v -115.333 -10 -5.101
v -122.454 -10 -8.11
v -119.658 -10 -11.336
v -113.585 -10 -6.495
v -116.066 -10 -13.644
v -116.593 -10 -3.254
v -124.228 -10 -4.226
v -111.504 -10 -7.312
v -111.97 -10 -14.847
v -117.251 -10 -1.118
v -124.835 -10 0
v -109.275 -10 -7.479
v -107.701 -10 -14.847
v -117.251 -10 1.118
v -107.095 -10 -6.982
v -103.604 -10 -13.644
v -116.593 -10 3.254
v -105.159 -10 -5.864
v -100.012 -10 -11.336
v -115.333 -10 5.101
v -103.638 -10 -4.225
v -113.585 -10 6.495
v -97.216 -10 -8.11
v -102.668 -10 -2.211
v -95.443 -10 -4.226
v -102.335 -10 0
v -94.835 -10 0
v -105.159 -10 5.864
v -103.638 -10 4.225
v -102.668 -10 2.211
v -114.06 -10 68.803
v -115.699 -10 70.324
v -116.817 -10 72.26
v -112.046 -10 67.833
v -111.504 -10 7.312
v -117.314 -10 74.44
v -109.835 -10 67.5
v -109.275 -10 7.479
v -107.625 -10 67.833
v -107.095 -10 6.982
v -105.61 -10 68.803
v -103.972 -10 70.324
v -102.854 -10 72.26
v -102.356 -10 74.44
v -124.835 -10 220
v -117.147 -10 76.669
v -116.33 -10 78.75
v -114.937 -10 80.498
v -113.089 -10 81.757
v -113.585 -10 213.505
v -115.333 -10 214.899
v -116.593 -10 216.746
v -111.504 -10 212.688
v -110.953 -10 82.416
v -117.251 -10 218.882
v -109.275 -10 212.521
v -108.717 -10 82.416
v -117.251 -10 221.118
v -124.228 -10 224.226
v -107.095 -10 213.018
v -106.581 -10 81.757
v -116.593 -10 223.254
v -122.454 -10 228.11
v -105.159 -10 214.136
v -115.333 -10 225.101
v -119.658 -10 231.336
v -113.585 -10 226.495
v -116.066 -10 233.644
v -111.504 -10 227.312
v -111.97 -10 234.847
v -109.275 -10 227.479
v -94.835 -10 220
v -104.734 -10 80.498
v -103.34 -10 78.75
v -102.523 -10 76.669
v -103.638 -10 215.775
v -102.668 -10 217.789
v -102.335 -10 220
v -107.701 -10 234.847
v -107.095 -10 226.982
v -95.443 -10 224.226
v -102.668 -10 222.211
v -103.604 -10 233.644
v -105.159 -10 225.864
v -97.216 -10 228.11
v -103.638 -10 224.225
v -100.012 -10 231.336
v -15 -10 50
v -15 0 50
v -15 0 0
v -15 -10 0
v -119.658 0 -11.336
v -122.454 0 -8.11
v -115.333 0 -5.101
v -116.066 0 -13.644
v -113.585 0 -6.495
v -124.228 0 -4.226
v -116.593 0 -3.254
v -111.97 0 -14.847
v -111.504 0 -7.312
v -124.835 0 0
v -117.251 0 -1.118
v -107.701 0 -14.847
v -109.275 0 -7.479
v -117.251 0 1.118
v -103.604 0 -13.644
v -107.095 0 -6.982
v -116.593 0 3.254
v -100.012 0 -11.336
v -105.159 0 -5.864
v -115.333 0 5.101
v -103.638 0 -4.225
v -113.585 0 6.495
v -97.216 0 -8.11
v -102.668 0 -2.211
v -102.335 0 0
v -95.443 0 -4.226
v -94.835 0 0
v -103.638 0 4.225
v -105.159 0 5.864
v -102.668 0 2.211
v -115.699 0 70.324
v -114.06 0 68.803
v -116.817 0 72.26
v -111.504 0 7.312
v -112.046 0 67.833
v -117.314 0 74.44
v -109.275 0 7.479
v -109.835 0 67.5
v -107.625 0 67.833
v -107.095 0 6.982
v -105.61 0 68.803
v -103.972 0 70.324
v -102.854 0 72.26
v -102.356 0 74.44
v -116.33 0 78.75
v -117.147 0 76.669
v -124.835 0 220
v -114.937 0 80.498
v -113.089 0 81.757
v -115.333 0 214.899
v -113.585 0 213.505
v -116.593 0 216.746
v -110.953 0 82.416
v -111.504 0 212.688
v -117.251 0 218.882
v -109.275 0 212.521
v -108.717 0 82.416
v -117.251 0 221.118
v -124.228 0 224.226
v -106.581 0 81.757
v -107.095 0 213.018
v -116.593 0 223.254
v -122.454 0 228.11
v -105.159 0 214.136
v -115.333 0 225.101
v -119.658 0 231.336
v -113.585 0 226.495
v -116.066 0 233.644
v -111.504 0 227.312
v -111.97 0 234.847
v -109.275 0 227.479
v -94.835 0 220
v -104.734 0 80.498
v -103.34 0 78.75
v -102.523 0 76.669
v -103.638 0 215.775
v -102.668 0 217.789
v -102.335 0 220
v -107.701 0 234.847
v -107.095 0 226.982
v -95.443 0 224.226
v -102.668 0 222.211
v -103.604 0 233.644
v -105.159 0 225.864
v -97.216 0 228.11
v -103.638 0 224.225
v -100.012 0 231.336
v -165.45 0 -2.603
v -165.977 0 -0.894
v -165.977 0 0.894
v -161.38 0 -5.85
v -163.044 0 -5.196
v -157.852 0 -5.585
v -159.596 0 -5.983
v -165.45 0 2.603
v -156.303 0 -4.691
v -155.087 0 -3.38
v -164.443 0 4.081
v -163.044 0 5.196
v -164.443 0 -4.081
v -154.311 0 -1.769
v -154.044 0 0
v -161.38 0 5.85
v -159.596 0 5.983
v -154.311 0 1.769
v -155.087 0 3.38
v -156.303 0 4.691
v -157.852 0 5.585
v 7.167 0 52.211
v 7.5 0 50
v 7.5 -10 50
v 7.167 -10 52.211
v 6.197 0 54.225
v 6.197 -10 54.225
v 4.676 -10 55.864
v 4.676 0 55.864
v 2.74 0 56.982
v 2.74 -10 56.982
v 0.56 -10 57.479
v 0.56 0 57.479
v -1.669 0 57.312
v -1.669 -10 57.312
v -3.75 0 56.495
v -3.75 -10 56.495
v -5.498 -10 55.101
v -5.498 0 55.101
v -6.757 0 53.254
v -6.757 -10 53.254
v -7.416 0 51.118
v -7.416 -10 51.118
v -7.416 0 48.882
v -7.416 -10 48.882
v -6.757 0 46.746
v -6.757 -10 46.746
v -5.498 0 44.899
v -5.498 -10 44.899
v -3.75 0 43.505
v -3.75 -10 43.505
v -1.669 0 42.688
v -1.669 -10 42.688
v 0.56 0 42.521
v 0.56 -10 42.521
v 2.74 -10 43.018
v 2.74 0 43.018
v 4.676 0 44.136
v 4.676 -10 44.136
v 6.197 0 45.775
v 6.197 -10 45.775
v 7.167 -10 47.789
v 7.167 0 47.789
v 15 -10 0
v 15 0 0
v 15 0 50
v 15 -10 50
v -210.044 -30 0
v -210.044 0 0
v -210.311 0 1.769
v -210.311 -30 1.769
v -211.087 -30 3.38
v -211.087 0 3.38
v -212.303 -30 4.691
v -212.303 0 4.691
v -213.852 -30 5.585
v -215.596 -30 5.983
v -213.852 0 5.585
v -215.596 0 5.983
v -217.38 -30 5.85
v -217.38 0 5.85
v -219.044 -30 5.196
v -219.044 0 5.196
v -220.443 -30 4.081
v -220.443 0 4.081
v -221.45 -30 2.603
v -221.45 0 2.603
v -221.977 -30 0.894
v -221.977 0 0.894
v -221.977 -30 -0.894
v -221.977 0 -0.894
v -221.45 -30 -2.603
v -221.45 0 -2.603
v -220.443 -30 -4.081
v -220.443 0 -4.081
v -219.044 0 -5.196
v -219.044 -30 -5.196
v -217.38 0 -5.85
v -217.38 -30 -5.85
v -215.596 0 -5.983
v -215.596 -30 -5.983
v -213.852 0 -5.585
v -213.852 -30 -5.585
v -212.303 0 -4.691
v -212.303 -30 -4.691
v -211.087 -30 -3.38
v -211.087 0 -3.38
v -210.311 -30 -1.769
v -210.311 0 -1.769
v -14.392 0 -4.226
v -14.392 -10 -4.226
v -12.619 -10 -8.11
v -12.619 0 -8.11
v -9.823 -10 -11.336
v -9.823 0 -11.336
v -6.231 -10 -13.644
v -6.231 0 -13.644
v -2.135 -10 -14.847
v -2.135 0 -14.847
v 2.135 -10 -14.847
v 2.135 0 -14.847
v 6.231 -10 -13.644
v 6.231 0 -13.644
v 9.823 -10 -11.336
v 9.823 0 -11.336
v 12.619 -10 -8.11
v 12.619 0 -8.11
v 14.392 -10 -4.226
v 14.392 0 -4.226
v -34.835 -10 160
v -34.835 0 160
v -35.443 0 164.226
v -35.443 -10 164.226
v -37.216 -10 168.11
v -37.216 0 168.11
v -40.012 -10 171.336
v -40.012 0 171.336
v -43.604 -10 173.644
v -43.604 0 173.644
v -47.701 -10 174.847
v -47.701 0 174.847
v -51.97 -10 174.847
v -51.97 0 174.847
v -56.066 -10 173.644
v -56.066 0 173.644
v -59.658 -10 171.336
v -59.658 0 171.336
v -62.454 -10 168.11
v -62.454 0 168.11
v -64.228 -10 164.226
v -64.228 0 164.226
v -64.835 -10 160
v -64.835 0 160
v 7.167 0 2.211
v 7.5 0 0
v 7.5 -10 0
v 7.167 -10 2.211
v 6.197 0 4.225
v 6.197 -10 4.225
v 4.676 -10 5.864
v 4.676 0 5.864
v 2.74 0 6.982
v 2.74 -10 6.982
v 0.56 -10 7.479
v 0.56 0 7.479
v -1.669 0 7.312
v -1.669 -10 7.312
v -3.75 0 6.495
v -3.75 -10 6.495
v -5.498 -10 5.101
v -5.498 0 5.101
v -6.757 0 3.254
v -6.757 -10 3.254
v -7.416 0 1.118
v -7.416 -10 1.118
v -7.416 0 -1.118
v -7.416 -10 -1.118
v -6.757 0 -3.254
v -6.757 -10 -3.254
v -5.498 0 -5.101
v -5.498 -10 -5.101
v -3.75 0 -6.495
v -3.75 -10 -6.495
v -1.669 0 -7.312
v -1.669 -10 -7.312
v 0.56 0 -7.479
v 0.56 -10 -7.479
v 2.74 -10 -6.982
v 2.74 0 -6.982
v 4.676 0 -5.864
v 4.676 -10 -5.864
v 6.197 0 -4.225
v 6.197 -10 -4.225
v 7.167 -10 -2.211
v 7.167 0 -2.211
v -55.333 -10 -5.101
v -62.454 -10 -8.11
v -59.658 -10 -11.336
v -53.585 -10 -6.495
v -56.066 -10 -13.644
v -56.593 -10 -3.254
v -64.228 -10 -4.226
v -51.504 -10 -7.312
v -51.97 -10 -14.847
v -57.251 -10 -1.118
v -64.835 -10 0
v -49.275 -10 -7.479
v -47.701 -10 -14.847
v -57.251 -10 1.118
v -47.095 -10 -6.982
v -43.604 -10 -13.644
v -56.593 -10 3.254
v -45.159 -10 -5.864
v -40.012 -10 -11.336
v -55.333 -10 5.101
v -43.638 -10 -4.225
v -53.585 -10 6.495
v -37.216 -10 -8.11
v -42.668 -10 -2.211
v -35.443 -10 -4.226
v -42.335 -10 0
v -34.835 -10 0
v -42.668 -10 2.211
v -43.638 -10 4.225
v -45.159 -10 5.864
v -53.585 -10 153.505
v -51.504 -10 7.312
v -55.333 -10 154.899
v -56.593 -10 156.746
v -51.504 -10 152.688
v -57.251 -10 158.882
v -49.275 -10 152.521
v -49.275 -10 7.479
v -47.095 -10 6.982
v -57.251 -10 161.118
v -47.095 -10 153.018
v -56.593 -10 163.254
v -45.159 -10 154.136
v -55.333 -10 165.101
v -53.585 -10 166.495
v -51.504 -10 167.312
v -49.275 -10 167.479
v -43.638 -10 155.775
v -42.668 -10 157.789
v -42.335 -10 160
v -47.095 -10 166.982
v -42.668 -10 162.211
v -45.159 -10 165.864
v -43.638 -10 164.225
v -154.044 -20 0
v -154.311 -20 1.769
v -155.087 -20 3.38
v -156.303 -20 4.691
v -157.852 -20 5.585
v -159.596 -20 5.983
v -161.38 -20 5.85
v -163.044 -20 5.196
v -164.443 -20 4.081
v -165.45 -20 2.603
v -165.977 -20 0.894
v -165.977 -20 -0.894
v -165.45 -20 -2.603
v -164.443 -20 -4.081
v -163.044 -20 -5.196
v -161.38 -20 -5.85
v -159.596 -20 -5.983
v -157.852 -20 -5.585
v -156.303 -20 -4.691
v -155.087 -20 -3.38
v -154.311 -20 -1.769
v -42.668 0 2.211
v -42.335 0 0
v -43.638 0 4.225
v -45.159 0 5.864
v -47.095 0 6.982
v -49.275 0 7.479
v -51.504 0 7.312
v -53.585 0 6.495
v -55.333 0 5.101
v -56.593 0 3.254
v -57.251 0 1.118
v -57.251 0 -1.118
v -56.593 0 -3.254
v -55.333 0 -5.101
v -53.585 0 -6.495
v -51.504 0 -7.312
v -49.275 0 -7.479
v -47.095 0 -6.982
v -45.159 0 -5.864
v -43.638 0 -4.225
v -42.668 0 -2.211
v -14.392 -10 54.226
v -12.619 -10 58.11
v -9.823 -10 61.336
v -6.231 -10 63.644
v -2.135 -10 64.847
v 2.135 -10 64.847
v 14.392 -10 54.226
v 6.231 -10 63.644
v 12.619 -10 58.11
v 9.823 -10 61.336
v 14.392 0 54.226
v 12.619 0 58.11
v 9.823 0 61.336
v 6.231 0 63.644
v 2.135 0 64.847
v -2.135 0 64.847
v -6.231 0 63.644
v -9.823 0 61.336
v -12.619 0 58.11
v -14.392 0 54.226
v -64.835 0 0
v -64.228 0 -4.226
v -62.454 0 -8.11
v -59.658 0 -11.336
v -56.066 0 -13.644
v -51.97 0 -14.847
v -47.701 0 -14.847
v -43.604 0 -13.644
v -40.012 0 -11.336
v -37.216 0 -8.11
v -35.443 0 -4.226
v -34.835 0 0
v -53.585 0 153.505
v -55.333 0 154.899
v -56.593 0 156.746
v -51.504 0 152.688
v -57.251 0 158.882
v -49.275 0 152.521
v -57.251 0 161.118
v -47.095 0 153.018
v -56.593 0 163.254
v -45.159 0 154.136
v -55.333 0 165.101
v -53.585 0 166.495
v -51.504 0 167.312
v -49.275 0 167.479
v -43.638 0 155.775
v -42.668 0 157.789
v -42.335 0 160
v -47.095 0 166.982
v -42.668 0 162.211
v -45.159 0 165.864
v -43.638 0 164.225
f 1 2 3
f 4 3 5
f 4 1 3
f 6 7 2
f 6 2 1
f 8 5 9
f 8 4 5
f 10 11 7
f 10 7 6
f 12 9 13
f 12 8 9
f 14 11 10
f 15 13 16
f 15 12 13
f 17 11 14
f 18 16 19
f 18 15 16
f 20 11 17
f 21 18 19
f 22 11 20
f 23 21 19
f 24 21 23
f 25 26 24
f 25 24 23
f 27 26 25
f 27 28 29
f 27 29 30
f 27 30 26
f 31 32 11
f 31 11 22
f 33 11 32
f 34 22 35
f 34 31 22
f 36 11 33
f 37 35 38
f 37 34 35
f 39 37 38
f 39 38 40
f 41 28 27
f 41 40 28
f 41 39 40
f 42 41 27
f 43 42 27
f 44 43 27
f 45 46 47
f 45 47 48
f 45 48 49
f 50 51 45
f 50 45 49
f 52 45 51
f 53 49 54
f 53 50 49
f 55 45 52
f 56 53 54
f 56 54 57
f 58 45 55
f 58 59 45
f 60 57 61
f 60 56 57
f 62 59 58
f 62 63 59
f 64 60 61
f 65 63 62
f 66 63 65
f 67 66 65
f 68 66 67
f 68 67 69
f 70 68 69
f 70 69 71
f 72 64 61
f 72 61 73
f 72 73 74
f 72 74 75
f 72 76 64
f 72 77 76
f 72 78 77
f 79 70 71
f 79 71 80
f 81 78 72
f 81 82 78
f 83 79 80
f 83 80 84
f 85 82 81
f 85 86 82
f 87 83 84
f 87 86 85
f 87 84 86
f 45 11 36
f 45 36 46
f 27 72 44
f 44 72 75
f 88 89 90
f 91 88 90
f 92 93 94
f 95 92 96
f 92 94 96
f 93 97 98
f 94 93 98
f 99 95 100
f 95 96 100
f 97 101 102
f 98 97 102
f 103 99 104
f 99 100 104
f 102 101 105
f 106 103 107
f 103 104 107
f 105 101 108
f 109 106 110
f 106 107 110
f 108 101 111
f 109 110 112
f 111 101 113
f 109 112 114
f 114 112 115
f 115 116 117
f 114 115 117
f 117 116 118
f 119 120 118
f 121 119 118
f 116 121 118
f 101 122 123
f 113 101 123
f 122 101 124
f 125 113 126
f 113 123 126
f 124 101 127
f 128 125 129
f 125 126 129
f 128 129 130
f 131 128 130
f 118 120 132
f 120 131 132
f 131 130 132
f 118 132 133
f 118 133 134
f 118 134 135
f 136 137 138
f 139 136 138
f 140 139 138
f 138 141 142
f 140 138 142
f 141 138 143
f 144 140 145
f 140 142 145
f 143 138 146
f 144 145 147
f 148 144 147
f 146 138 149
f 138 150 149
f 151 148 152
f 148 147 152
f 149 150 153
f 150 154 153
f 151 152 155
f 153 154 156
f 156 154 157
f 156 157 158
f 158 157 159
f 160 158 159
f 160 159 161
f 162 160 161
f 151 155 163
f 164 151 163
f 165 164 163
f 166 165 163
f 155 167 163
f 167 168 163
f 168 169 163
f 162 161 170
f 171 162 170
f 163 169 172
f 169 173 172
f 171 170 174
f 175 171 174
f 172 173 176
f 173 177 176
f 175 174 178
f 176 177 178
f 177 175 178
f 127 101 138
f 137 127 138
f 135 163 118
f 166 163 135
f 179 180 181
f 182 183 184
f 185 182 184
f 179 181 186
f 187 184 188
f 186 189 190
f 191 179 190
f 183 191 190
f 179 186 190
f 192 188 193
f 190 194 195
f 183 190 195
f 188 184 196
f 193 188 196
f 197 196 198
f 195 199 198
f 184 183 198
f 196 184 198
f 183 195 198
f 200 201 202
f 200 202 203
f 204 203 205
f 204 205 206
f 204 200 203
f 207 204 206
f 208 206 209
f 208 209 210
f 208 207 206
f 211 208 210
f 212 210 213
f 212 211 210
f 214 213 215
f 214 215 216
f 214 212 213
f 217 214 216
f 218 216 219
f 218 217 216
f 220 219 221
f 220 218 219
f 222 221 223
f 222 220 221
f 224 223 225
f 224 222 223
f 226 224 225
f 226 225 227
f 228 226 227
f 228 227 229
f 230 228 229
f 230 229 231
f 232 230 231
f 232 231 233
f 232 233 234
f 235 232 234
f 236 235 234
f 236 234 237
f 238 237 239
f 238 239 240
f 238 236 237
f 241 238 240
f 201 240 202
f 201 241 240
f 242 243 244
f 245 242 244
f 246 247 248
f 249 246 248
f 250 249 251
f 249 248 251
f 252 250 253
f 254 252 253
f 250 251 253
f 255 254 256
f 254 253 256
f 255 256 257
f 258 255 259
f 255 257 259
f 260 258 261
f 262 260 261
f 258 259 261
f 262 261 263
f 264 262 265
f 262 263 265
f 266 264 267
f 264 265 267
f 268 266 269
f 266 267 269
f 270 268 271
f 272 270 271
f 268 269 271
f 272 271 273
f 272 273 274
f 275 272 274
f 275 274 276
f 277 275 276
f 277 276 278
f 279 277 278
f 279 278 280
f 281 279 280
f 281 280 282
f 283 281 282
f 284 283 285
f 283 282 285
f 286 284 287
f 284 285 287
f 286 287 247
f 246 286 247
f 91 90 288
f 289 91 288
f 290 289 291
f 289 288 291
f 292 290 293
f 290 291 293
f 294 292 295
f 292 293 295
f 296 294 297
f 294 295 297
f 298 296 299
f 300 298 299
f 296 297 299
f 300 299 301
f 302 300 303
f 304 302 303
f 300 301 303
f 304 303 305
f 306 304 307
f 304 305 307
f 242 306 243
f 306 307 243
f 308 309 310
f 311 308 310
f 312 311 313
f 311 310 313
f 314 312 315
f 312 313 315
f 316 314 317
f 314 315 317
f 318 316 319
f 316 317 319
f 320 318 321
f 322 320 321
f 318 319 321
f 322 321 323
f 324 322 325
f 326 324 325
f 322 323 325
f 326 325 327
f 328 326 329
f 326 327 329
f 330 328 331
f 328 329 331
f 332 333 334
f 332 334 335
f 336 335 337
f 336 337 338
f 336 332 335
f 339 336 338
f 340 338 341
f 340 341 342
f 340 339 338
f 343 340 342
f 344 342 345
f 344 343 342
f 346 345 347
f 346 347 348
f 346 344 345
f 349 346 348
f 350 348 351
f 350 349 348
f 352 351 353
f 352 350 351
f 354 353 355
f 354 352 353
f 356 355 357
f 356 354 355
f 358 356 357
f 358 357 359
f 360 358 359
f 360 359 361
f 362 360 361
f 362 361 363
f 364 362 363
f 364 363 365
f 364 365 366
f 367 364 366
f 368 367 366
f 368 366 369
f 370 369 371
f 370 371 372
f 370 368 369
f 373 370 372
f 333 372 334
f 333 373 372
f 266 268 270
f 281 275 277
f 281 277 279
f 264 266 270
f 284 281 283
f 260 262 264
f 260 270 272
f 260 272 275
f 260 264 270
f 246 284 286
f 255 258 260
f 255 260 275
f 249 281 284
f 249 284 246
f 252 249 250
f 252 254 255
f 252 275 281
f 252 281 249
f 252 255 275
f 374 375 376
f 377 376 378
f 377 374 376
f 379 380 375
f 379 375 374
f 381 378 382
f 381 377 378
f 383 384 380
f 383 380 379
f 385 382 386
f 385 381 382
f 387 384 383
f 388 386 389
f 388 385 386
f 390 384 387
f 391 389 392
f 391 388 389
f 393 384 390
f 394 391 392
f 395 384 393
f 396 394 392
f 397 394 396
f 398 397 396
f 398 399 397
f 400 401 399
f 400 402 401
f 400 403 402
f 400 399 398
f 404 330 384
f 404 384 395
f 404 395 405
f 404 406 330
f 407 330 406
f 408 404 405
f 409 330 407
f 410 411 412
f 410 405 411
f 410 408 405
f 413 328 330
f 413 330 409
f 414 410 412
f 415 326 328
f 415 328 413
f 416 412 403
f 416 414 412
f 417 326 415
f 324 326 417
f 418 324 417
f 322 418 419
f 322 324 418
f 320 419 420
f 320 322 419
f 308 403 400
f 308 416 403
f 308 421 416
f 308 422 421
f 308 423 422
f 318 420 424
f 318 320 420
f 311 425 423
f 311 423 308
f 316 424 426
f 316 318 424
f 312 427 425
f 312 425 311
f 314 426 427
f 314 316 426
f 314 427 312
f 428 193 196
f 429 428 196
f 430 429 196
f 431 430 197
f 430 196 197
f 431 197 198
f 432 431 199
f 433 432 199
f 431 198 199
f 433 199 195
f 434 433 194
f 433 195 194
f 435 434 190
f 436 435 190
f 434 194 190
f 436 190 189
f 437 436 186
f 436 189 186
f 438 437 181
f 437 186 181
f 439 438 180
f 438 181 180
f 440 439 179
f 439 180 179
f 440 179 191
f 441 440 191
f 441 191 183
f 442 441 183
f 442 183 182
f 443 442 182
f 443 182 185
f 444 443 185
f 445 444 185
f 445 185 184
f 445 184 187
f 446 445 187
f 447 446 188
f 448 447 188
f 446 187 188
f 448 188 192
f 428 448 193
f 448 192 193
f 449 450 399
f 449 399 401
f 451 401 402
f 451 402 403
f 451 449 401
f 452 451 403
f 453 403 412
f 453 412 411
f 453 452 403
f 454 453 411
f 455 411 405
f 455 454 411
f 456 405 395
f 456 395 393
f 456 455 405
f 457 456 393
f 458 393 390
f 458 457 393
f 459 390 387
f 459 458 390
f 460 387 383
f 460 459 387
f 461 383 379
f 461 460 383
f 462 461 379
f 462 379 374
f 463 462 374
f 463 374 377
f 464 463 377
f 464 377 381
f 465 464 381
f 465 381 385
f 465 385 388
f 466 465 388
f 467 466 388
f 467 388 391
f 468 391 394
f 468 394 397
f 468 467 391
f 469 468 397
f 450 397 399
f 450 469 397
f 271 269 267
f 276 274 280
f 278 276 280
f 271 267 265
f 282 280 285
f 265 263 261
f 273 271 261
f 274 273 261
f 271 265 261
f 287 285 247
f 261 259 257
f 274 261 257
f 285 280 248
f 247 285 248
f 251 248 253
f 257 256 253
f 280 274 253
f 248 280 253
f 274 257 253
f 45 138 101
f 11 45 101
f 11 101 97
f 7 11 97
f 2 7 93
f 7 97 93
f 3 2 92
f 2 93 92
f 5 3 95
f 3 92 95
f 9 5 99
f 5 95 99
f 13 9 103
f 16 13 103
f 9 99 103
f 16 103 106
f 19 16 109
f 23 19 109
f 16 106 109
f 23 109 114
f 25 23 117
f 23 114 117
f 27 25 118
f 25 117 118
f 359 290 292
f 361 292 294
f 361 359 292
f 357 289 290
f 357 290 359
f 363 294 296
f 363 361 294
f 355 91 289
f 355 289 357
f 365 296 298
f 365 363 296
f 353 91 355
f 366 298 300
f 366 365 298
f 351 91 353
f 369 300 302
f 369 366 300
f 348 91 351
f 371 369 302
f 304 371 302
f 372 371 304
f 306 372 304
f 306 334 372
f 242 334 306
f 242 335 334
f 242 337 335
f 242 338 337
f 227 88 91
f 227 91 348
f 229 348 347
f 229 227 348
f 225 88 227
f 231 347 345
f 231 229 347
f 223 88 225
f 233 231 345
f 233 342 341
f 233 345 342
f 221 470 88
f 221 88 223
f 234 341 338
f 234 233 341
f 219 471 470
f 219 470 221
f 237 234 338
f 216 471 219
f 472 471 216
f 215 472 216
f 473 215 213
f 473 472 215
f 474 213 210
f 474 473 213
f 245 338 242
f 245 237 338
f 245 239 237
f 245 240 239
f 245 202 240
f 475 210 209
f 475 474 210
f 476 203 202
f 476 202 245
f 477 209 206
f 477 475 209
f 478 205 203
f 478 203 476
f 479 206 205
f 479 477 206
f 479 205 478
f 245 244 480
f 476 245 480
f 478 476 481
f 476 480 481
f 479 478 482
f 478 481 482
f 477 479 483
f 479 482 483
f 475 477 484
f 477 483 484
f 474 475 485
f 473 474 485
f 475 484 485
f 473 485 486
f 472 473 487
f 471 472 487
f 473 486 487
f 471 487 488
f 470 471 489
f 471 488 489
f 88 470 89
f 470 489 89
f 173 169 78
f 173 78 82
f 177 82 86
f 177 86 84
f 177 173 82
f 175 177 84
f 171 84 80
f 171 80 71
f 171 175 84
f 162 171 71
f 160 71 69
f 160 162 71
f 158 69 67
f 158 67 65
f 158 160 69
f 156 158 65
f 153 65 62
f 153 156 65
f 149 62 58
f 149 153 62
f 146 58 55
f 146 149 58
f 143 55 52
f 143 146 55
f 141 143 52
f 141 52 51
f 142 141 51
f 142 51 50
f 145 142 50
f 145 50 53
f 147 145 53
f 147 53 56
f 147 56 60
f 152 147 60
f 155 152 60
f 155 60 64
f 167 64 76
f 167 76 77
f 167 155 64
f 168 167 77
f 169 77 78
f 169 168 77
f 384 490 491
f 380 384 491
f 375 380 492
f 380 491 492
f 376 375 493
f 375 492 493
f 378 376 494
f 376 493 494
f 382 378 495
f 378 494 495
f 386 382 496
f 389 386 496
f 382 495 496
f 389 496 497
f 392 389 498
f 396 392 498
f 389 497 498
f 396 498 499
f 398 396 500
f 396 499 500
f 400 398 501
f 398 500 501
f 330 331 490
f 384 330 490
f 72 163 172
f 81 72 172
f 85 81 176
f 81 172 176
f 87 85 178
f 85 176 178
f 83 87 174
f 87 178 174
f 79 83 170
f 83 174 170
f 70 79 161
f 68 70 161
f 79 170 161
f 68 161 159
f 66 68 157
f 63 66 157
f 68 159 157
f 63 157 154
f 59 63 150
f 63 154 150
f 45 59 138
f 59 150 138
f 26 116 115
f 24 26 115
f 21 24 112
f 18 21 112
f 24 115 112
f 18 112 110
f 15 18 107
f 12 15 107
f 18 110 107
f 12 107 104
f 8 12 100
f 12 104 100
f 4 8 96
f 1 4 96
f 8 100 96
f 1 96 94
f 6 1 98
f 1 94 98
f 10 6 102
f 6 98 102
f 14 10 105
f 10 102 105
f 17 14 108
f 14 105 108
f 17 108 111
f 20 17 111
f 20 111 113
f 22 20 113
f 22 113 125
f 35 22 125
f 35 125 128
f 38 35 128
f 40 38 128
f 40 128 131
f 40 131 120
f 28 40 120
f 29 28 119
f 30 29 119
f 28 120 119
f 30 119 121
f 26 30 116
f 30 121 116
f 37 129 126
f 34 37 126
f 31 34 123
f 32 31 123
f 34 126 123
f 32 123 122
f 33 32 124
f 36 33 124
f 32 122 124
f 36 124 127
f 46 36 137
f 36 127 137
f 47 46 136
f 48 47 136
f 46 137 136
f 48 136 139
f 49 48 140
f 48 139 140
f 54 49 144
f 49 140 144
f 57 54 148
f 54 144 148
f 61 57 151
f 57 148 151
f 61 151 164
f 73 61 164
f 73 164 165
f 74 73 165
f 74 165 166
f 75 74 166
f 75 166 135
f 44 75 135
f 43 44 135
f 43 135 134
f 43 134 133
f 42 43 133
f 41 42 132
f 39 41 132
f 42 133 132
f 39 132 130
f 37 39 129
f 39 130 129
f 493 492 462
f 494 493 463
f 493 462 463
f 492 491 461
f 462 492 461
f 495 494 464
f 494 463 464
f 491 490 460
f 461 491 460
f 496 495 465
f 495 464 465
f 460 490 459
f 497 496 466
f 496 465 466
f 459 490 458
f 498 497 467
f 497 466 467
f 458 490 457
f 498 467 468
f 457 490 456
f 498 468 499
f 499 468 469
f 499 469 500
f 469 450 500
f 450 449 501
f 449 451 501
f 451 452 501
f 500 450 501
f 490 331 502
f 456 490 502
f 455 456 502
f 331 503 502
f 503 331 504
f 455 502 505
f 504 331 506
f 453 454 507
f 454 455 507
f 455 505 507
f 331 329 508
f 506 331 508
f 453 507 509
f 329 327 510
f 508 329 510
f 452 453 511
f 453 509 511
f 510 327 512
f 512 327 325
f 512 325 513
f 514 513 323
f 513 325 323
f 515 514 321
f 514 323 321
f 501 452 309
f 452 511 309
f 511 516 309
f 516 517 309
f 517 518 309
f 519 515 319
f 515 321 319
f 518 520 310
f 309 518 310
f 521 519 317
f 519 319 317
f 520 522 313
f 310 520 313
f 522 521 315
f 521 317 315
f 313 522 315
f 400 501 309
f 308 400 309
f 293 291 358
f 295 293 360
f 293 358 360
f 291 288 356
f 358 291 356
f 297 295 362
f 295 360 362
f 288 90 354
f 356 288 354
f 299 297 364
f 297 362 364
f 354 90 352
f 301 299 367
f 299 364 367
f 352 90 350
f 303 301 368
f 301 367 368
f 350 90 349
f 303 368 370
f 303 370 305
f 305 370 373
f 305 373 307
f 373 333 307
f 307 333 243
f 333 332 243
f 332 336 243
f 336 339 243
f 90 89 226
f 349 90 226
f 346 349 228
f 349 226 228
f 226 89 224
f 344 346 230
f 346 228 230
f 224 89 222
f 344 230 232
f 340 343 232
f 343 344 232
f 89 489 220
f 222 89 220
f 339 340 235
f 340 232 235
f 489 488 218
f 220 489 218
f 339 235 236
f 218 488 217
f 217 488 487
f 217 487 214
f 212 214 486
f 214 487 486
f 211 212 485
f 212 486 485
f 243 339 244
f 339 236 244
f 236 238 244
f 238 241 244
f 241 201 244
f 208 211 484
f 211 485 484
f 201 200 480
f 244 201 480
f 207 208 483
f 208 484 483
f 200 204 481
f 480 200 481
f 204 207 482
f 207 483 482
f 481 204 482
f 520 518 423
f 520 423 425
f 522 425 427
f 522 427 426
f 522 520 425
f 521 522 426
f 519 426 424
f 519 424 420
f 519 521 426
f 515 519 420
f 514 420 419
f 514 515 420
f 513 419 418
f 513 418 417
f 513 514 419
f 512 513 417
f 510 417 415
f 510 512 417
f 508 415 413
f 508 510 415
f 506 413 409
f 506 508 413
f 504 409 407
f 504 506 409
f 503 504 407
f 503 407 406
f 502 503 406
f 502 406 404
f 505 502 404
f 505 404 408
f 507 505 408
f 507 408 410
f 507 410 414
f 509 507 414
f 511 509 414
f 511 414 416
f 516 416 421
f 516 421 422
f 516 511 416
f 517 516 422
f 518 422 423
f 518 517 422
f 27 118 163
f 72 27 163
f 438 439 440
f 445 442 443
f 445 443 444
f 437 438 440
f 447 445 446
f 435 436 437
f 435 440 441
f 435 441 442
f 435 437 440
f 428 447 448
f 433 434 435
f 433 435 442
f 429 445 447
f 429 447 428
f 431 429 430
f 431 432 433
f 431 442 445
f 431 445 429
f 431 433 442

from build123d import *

# Parameters (mm, degrees)
F1_R      = 7.5
F2_DEPTH  = 10
F3_R      = 7.5
F4_DEPTH  = 10
F5_R      = 7.5
F6_DEPTH  = 10
F7_R      = 6
F8_DEPTH  = 20
F9_R      = 6
F10_DEPTH = 30


with BuildPart() as f2:
    # F1 (on Front) → F2 (new body)
    with BuildSketch(Plane.XZ):
        with BuildLine():
            Line((-15, 50), (-15, 0))
            ThreePointArc((-15, 0), (0, -15), (15, 0))
            Line((15, 0), (15, 50))
            ThreePointArc((15, 50), (0, 65), (-15, 50))
        make_face()
        Circle(F1_R, mode=Mode.SUBTRACT)
        with Locations((0, 50)):
            Circle(F1_R, mode=Mode.SUBTRACT)
    extrude(amount=F2_DEPTH)


with BuildPart() as f4:
    # F3 (on Front) → F4 (new body)
    with BuildSketch(Plane.XZ):
        with BuildLine():
            Line((-64.8352653698, 160), (-64.8352653698, 0))
            ThreePointArc((-64.8352653698, 0), (-49.8352653698, -15), (-34.8352653698, 0))
            Line((-34.8352653698, 0), (-34.8352653698, 160))
            ThreePointArc((-34.8352653698, 160), (-49.8352653698, 175), (-64.8352653698, 160))
        make_face()
        with Locations((-49.8352653698, 0)):
            Circle(F3_R, mode=Mode.SUBTRACT)
        with Locations((-49.8352653698, 160)):
            Circle(F3_R, mode=Mode.SUBTRACT)
    extrude(amount=F4_DEPTH)


with BuildPart() as f6:
    # F5 (on Front) → F6 (new body)
    with BuildSketch(Plane.XZ):
        with BuildLine():
            Line((-124.8352653698, 220), (-124.8352653698, 0))
            ThreePointArc((-124.8352653698, 0), (-109.8352653698, -15), (-94.8352653698, 0))
            Line((-94.8352653698, 0), (-94.8352653698, 220))
            ThreePointArc((-94.8352653698, 220), (-109.8352653698, 235), (-124.8352653698, 220))
        make_face()
        with BuildLine():
            ThreePointArc((-109.8352653698, 7.5), (-104.5319645109, 5.3033008589), (-102.3352653698, 0))
            ThreePointArc((-102.3352653698, 0), (-115.1385662287, -5.3033008589), (-109.8352653698, 7.5))
        make_face(mode=Mode.SUBTRACT)
        with BuildLine():
            ThreePointArc((-102.3352653698, 75), (-104.5319645109, 69.6966991411), (-109.8352653698, 67.5))
            ThreePointArc((-109.8352653698, 67.5), (-115.1385662287, 80.3033008589), (-102.3352653698, 75))
        make_face(mode=Mode.SUBTRACT)
        with Locations((-109.8352653698, 220)):
            Circle(F5_R, mode=Mode.SUBTRACT)
    extrude(amount=F6_DEPTH)


with BuildPart() as f8:
    # F7 (on Front) → F8 (new body)
    with BuildSketch(Plane.XZ):
        with Locations((-160.0444316864, 0)):
            Circle(F7_R)
    extrude(amount=F8_DEPTH)


with BuildPart() as f10:
    # F9 (on Front) → F10 (new body)
    with BuildSketch(Plane.XZ):
        with Locations((-216.0444316864, 0)):
            Circle(F9_R)
    extrude(amount=F10_DEPTH)


solid = Compound([f2.part, f4.part, f6.part, f8.part, f10.part])
